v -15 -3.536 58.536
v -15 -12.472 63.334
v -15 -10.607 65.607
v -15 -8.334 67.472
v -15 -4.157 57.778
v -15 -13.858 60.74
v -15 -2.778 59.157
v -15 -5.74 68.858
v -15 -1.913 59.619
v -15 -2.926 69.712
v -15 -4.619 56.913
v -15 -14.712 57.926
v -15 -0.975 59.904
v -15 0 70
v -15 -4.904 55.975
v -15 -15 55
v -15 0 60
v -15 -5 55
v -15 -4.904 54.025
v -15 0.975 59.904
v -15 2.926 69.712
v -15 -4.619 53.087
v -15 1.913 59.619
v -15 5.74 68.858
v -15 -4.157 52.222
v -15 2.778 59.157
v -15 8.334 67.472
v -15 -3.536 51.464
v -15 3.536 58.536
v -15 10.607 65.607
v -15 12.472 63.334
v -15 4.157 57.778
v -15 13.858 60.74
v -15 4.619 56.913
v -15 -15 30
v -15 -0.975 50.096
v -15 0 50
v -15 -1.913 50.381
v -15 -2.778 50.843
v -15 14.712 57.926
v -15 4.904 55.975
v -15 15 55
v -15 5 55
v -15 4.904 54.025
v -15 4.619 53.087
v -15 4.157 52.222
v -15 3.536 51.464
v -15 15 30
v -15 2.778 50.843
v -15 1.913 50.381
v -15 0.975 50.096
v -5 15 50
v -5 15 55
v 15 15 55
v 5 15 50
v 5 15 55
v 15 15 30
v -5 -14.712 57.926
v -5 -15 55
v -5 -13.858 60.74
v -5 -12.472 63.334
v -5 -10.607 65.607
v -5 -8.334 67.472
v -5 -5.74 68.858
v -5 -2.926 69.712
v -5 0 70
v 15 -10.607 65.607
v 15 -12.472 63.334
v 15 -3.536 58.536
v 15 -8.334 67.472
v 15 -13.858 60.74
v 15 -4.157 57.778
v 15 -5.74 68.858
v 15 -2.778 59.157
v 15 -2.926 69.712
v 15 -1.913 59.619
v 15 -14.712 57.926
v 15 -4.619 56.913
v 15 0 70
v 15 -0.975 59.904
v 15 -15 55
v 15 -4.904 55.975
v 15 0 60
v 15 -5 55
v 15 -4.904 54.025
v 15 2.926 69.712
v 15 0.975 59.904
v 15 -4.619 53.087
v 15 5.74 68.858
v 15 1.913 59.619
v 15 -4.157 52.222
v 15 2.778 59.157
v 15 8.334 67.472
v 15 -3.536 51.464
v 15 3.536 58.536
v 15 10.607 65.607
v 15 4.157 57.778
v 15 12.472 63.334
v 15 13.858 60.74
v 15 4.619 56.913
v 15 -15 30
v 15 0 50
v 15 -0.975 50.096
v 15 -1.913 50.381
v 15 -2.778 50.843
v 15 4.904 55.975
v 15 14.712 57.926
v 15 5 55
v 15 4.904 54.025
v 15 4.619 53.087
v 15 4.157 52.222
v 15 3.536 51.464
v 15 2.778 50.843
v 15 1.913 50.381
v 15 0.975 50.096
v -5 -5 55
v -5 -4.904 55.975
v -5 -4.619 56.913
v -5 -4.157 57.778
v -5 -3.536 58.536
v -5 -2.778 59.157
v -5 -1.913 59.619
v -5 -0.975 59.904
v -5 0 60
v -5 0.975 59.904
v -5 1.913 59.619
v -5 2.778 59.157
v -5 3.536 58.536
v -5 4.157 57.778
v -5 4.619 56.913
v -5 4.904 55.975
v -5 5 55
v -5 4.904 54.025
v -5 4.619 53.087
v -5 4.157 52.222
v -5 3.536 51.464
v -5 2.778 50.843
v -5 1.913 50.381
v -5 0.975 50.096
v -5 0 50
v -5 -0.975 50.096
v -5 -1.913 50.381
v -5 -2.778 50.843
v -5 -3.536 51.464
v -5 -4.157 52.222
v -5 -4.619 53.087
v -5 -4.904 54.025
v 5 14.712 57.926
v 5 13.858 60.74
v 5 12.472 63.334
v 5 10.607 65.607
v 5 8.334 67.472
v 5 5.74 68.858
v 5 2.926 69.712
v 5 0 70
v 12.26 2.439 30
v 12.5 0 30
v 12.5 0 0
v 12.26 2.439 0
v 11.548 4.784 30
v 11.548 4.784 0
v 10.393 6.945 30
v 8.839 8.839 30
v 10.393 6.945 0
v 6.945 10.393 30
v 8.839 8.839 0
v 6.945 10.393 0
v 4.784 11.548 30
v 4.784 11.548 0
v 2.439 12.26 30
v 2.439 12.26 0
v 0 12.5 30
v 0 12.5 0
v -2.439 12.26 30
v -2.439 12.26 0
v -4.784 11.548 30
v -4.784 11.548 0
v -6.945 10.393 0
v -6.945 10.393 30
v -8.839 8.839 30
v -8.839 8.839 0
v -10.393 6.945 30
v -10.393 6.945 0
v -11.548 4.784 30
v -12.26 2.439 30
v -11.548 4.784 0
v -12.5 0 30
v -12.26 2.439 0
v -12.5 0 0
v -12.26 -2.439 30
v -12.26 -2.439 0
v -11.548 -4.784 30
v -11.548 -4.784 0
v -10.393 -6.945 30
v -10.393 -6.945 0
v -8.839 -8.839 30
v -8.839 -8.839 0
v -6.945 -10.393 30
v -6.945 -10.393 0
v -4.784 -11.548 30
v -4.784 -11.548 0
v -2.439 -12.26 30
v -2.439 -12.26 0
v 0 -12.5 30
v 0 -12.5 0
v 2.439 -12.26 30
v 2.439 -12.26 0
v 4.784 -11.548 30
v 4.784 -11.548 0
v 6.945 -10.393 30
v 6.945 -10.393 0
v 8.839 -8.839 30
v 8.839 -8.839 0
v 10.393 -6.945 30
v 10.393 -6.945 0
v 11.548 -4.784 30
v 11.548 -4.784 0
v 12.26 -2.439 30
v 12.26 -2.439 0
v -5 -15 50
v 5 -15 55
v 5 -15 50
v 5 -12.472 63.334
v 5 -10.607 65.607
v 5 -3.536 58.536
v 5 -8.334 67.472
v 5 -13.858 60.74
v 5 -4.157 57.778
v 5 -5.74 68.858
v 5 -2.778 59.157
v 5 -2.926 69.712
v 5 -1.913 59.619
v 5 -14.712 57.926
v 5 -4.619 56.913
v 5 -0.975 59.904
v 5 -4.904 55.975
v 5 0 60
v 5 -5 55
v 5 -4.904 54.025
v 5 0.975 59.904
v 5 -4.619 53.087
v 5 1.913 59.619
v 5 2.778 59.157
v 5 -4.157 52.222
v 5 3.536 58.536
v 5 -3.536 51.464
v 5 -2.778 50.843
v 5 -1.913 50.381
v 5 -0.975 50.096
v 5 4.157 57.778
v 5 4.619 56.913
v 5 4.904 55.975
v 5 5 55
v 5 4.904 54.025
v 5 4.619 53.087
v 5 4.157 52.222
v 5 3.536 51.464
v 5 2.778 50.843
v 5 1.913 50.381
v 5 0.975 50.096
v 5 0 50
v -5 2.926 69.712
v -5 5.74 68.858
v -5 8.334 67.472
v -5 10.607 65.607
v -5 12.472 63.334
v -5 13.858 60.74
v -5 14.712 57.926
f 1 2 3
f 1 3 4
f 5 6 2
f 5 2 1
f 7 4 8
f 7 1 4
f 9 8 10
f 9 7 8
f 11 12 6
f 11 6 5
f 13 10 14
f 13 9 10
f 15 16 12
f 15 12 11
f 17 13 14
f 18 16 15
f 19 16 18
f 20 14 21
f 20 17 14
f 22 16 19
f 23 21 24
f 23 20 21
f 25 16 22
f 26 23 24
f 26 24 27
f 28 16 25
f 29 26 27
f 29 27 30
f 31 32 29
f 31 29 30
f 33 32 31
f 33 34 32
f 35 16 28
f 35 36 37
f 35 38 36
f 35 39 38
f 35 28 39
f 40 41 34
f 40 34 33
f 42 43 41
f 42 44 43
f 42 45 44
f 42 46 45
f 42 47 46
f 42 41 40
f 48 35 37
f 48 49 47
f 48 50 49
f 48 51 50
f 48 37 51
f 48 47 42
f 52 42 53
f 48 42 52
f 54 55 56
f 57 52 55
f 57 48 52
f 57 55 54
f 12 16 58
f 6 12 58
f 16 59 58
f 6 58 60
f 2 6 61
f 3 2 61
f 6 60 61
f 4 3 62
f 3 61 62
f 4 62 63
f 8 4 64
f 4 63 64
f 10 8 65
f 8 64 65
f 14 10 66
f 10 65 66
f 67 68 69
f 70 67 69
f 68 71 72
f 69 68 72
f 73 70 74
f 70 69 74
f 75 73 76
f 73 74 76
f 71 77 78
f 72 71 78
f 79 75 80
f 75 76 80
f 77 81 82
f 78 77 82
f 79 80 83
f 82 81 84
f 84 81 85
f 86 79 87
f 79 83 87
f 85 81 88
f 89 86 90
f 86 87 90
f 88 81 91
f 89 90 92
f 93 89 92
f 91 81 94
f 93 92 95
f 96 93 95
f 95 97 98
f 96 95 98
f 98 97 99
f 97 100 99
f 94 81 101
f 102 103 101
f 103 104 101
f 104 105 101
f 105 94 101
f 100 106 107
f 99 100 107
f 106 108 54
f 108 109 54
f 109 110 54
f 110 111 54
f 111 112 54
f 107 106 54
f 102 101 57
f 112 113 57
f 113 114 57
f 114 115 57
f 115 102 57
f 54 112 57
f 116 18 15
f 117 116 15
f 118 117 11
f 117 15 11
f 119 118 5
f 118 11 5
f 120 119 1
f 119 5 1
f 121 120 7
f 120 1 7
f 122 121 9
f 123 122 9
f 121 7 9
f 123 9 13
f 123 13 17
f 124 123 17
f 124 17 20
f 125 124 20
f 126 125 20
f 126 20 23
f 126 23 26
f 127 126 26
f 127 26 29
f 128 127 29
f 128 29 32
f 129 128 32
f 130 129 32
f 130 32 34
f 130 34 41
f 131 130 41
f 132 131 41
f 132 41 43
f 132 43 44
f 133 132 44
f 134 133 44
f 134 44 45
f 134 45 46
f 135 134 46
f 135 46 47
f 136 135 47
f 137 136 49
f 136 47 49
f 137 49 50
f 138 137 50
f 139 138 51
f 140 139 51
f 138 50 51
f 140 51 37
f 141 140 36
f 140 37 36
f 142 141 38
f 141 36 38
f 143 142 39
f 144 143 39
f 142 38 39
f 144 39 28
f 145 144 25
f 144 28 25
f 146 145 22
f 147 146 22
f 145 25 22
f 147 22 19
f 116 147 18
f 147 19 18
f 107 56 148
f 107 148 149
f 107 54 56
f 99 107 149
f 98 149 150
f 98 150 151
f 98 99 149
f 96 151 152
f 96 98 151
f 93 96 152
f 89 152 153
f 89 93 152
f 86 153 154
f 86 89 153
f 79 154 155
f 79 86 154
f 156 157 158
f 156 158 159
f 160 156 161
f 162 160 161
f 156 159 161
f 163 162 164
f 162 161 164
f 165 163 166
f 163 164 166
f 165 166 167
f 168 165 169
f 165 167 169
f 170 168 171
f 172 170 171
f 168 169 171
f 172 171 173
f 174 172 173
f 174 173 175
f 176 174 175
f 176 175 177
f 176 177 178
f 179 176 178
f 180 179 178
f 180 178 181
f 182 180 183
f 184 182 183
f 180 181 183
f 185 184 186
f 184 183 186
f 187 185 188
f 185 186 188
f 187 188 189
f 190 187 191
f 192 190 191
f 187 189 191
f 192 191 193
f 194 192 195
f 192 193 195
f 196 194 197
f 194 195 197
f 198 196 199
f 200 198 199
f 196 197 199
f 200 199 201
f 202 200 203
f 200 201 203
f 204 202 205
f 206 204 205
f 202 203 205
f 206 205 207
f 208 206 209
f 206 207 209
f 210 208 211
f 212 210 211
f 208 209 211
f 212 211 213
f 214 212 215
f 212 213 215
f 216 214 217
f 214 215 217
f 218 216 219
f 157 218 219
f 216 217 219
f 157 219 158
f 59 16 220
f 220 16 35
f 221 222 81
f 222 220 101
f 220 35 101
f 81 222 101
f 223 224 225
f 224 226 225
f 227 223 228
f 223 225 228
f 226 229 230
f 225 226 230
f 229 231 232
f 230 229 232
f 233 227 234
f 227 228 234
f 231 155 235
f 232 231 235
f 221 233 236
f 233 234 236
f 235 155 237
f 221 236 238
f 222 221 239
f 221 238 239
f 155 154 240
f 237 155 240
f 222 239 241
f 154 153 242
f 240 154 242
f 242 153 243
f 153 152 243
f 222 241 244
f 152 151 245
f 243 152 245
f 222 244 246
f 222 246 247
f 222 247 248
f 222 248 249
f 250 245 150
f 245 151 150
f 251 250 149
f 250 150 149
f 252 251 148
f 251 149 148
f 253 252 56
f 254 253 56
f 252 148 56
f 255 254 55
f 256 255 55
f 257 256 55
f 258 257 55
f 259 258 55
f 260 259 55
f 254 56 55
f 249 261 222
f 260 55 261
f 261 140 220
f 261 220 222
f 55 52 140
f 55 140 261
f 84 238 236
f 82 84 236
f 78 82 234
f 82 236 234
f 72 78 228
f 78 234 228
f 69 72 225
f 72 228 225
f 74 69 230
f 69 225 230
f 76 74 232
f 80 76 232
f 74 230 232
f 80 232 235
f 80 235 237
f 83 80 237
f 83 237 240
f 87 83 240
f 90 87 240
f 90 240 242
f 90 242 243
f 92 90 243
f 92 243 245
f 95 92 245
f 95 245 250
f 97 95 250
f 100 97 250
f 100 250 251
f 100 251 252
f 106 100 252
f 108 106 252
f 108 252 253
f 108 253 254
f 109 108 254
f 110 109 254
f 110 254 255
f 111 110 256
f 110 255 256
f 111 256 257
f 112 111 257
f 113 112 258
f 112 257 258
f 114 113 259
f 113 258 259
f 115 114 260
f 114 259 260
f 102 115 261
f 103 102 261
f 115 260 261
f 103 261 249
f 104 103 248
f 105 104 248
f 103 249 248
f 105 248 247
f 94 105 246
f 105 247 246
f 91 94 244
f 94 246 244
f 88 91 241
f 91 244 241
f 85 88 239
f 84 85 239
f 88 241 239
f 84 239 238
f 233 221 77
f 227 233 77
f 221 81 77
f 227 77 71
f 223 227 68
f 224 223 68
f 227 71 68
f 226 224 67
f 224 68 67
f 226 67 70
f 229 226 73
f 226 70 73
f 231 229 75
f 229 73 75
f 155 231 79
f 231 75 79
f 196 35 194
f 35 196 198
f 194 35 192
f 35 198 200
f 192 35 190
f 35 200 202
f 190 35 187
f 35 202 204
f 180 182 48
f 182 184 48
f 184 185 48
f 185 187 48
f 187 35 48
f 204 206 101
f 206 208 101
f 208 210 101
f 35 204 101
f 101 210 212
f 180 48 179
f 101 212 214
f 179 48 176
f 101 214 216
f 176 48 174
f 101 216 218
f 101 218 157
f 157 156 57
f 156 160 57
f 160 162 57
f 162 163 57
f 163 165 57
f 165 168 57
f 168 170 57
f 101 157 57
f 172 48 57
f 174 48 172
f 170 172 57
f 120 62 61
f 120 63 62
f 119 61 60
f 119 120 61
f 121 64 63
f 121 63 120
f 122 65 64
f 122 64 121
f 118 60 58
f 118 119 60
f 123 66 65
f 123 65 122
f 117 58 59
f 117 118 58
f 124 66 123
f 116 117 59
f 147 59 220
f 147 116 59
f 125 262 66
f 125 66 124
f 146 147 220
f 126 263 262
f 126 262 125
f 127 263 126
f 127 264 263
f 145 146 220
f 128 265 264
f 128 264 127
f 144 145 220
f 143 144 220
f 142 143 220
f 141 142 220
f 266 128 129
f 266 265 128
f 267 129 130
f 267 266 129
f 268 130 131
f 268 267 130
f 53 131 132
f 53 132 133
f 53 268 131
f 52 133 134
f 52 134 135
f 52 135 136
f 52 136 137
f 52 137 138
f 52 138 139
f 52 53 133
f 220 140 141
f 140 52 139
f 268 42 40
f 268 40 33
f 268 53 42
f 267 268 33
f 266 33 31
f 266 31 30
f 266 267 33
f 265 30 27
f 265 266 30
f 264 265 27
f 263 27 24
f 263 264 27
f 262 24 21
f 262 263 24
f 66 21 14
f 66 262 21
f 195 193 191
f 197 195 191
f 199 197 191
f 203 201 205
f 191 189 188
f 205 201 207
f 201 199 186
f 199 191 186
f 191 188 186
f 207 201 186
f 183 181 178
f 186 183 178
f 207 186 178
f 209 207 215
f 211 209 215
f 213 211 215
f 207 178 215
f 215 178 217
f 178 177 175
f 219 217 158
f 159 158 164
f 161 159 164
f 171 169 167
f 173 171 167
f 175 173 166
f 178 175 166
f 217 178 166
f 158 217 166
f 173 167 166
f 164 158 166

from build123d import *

# Parameters (mm, degrees)
SKETCH2_R           = 12.5
BOSS_EXTRUDE1_DEPTH = 30
SKETCH3_W           = 30
SKETCH3_H           = 30
BOSS_EXTRUDE2_DEPTH = 40
SKETCH4_W           = 10
SKETCH4_H           = 20
CUT_EXTRUDE1_DEPTH  = 40
FILLET1_R           = 15
SKETCH5_R           = 5
CUT_EXTRUDE2_DEPTH  = 40


with BuildPart() as part:
    # Sketch2 → Boss-Extrude1 (new body)
    with BuildSketch(Plane.XY):
        Circle(SKETCH2_R)
    extrude(amount=BOSS_EXTRUDE1_DEPTH)

    # Sketch3 → Boss-Extrude2 (add)
    with BuildSketch(Plane.XY.offset(30)):
        Rectangle(SKETCH3_W, SKETCH3_H)
    extrude(amount=BOSS_EXTRUDE2_DEPTH)

    # Sketch4 → Cut-Extrude1 (cut)
    with BuildSketch(Plane(origin=(0, 15, 0), x_dir=(1, 0, 0), z_dir=(0, 1, 0))):
        with Locations((0, -60)):
            Rectangle(SKETCH4_W, SKETCH4_H)
    extrude(amount=-CUT_EXTRUDE1_DEPTH, mode=Mode.SUBTRACT)

    # Fillet1
    fillet1_edges = [part.edges().sort_by_distance(p)[0] for p in [
        (10, 15, 70),
        (10, -15, 70),
        (-10, -15, 70),
        (-10, 15, 70),
    ]]
    fillet(fillet1_edges, radius=FILLET1_R - 0.0001)  # a hair under: the kernel refuses the full size

    # Sketch5 → Cut-Extrude2 (cut)
    with BuildSketch(Plane.ZY.offset(15)):
        with Locations(Location((55, 0, 0), (0, 0, 270))):
            Circle(SKETCH5_R)
    extrude(amount=-CUT_EXTRUDE2_DEPTH, mode=Mode.SUBTRACT)


solid = part.part
